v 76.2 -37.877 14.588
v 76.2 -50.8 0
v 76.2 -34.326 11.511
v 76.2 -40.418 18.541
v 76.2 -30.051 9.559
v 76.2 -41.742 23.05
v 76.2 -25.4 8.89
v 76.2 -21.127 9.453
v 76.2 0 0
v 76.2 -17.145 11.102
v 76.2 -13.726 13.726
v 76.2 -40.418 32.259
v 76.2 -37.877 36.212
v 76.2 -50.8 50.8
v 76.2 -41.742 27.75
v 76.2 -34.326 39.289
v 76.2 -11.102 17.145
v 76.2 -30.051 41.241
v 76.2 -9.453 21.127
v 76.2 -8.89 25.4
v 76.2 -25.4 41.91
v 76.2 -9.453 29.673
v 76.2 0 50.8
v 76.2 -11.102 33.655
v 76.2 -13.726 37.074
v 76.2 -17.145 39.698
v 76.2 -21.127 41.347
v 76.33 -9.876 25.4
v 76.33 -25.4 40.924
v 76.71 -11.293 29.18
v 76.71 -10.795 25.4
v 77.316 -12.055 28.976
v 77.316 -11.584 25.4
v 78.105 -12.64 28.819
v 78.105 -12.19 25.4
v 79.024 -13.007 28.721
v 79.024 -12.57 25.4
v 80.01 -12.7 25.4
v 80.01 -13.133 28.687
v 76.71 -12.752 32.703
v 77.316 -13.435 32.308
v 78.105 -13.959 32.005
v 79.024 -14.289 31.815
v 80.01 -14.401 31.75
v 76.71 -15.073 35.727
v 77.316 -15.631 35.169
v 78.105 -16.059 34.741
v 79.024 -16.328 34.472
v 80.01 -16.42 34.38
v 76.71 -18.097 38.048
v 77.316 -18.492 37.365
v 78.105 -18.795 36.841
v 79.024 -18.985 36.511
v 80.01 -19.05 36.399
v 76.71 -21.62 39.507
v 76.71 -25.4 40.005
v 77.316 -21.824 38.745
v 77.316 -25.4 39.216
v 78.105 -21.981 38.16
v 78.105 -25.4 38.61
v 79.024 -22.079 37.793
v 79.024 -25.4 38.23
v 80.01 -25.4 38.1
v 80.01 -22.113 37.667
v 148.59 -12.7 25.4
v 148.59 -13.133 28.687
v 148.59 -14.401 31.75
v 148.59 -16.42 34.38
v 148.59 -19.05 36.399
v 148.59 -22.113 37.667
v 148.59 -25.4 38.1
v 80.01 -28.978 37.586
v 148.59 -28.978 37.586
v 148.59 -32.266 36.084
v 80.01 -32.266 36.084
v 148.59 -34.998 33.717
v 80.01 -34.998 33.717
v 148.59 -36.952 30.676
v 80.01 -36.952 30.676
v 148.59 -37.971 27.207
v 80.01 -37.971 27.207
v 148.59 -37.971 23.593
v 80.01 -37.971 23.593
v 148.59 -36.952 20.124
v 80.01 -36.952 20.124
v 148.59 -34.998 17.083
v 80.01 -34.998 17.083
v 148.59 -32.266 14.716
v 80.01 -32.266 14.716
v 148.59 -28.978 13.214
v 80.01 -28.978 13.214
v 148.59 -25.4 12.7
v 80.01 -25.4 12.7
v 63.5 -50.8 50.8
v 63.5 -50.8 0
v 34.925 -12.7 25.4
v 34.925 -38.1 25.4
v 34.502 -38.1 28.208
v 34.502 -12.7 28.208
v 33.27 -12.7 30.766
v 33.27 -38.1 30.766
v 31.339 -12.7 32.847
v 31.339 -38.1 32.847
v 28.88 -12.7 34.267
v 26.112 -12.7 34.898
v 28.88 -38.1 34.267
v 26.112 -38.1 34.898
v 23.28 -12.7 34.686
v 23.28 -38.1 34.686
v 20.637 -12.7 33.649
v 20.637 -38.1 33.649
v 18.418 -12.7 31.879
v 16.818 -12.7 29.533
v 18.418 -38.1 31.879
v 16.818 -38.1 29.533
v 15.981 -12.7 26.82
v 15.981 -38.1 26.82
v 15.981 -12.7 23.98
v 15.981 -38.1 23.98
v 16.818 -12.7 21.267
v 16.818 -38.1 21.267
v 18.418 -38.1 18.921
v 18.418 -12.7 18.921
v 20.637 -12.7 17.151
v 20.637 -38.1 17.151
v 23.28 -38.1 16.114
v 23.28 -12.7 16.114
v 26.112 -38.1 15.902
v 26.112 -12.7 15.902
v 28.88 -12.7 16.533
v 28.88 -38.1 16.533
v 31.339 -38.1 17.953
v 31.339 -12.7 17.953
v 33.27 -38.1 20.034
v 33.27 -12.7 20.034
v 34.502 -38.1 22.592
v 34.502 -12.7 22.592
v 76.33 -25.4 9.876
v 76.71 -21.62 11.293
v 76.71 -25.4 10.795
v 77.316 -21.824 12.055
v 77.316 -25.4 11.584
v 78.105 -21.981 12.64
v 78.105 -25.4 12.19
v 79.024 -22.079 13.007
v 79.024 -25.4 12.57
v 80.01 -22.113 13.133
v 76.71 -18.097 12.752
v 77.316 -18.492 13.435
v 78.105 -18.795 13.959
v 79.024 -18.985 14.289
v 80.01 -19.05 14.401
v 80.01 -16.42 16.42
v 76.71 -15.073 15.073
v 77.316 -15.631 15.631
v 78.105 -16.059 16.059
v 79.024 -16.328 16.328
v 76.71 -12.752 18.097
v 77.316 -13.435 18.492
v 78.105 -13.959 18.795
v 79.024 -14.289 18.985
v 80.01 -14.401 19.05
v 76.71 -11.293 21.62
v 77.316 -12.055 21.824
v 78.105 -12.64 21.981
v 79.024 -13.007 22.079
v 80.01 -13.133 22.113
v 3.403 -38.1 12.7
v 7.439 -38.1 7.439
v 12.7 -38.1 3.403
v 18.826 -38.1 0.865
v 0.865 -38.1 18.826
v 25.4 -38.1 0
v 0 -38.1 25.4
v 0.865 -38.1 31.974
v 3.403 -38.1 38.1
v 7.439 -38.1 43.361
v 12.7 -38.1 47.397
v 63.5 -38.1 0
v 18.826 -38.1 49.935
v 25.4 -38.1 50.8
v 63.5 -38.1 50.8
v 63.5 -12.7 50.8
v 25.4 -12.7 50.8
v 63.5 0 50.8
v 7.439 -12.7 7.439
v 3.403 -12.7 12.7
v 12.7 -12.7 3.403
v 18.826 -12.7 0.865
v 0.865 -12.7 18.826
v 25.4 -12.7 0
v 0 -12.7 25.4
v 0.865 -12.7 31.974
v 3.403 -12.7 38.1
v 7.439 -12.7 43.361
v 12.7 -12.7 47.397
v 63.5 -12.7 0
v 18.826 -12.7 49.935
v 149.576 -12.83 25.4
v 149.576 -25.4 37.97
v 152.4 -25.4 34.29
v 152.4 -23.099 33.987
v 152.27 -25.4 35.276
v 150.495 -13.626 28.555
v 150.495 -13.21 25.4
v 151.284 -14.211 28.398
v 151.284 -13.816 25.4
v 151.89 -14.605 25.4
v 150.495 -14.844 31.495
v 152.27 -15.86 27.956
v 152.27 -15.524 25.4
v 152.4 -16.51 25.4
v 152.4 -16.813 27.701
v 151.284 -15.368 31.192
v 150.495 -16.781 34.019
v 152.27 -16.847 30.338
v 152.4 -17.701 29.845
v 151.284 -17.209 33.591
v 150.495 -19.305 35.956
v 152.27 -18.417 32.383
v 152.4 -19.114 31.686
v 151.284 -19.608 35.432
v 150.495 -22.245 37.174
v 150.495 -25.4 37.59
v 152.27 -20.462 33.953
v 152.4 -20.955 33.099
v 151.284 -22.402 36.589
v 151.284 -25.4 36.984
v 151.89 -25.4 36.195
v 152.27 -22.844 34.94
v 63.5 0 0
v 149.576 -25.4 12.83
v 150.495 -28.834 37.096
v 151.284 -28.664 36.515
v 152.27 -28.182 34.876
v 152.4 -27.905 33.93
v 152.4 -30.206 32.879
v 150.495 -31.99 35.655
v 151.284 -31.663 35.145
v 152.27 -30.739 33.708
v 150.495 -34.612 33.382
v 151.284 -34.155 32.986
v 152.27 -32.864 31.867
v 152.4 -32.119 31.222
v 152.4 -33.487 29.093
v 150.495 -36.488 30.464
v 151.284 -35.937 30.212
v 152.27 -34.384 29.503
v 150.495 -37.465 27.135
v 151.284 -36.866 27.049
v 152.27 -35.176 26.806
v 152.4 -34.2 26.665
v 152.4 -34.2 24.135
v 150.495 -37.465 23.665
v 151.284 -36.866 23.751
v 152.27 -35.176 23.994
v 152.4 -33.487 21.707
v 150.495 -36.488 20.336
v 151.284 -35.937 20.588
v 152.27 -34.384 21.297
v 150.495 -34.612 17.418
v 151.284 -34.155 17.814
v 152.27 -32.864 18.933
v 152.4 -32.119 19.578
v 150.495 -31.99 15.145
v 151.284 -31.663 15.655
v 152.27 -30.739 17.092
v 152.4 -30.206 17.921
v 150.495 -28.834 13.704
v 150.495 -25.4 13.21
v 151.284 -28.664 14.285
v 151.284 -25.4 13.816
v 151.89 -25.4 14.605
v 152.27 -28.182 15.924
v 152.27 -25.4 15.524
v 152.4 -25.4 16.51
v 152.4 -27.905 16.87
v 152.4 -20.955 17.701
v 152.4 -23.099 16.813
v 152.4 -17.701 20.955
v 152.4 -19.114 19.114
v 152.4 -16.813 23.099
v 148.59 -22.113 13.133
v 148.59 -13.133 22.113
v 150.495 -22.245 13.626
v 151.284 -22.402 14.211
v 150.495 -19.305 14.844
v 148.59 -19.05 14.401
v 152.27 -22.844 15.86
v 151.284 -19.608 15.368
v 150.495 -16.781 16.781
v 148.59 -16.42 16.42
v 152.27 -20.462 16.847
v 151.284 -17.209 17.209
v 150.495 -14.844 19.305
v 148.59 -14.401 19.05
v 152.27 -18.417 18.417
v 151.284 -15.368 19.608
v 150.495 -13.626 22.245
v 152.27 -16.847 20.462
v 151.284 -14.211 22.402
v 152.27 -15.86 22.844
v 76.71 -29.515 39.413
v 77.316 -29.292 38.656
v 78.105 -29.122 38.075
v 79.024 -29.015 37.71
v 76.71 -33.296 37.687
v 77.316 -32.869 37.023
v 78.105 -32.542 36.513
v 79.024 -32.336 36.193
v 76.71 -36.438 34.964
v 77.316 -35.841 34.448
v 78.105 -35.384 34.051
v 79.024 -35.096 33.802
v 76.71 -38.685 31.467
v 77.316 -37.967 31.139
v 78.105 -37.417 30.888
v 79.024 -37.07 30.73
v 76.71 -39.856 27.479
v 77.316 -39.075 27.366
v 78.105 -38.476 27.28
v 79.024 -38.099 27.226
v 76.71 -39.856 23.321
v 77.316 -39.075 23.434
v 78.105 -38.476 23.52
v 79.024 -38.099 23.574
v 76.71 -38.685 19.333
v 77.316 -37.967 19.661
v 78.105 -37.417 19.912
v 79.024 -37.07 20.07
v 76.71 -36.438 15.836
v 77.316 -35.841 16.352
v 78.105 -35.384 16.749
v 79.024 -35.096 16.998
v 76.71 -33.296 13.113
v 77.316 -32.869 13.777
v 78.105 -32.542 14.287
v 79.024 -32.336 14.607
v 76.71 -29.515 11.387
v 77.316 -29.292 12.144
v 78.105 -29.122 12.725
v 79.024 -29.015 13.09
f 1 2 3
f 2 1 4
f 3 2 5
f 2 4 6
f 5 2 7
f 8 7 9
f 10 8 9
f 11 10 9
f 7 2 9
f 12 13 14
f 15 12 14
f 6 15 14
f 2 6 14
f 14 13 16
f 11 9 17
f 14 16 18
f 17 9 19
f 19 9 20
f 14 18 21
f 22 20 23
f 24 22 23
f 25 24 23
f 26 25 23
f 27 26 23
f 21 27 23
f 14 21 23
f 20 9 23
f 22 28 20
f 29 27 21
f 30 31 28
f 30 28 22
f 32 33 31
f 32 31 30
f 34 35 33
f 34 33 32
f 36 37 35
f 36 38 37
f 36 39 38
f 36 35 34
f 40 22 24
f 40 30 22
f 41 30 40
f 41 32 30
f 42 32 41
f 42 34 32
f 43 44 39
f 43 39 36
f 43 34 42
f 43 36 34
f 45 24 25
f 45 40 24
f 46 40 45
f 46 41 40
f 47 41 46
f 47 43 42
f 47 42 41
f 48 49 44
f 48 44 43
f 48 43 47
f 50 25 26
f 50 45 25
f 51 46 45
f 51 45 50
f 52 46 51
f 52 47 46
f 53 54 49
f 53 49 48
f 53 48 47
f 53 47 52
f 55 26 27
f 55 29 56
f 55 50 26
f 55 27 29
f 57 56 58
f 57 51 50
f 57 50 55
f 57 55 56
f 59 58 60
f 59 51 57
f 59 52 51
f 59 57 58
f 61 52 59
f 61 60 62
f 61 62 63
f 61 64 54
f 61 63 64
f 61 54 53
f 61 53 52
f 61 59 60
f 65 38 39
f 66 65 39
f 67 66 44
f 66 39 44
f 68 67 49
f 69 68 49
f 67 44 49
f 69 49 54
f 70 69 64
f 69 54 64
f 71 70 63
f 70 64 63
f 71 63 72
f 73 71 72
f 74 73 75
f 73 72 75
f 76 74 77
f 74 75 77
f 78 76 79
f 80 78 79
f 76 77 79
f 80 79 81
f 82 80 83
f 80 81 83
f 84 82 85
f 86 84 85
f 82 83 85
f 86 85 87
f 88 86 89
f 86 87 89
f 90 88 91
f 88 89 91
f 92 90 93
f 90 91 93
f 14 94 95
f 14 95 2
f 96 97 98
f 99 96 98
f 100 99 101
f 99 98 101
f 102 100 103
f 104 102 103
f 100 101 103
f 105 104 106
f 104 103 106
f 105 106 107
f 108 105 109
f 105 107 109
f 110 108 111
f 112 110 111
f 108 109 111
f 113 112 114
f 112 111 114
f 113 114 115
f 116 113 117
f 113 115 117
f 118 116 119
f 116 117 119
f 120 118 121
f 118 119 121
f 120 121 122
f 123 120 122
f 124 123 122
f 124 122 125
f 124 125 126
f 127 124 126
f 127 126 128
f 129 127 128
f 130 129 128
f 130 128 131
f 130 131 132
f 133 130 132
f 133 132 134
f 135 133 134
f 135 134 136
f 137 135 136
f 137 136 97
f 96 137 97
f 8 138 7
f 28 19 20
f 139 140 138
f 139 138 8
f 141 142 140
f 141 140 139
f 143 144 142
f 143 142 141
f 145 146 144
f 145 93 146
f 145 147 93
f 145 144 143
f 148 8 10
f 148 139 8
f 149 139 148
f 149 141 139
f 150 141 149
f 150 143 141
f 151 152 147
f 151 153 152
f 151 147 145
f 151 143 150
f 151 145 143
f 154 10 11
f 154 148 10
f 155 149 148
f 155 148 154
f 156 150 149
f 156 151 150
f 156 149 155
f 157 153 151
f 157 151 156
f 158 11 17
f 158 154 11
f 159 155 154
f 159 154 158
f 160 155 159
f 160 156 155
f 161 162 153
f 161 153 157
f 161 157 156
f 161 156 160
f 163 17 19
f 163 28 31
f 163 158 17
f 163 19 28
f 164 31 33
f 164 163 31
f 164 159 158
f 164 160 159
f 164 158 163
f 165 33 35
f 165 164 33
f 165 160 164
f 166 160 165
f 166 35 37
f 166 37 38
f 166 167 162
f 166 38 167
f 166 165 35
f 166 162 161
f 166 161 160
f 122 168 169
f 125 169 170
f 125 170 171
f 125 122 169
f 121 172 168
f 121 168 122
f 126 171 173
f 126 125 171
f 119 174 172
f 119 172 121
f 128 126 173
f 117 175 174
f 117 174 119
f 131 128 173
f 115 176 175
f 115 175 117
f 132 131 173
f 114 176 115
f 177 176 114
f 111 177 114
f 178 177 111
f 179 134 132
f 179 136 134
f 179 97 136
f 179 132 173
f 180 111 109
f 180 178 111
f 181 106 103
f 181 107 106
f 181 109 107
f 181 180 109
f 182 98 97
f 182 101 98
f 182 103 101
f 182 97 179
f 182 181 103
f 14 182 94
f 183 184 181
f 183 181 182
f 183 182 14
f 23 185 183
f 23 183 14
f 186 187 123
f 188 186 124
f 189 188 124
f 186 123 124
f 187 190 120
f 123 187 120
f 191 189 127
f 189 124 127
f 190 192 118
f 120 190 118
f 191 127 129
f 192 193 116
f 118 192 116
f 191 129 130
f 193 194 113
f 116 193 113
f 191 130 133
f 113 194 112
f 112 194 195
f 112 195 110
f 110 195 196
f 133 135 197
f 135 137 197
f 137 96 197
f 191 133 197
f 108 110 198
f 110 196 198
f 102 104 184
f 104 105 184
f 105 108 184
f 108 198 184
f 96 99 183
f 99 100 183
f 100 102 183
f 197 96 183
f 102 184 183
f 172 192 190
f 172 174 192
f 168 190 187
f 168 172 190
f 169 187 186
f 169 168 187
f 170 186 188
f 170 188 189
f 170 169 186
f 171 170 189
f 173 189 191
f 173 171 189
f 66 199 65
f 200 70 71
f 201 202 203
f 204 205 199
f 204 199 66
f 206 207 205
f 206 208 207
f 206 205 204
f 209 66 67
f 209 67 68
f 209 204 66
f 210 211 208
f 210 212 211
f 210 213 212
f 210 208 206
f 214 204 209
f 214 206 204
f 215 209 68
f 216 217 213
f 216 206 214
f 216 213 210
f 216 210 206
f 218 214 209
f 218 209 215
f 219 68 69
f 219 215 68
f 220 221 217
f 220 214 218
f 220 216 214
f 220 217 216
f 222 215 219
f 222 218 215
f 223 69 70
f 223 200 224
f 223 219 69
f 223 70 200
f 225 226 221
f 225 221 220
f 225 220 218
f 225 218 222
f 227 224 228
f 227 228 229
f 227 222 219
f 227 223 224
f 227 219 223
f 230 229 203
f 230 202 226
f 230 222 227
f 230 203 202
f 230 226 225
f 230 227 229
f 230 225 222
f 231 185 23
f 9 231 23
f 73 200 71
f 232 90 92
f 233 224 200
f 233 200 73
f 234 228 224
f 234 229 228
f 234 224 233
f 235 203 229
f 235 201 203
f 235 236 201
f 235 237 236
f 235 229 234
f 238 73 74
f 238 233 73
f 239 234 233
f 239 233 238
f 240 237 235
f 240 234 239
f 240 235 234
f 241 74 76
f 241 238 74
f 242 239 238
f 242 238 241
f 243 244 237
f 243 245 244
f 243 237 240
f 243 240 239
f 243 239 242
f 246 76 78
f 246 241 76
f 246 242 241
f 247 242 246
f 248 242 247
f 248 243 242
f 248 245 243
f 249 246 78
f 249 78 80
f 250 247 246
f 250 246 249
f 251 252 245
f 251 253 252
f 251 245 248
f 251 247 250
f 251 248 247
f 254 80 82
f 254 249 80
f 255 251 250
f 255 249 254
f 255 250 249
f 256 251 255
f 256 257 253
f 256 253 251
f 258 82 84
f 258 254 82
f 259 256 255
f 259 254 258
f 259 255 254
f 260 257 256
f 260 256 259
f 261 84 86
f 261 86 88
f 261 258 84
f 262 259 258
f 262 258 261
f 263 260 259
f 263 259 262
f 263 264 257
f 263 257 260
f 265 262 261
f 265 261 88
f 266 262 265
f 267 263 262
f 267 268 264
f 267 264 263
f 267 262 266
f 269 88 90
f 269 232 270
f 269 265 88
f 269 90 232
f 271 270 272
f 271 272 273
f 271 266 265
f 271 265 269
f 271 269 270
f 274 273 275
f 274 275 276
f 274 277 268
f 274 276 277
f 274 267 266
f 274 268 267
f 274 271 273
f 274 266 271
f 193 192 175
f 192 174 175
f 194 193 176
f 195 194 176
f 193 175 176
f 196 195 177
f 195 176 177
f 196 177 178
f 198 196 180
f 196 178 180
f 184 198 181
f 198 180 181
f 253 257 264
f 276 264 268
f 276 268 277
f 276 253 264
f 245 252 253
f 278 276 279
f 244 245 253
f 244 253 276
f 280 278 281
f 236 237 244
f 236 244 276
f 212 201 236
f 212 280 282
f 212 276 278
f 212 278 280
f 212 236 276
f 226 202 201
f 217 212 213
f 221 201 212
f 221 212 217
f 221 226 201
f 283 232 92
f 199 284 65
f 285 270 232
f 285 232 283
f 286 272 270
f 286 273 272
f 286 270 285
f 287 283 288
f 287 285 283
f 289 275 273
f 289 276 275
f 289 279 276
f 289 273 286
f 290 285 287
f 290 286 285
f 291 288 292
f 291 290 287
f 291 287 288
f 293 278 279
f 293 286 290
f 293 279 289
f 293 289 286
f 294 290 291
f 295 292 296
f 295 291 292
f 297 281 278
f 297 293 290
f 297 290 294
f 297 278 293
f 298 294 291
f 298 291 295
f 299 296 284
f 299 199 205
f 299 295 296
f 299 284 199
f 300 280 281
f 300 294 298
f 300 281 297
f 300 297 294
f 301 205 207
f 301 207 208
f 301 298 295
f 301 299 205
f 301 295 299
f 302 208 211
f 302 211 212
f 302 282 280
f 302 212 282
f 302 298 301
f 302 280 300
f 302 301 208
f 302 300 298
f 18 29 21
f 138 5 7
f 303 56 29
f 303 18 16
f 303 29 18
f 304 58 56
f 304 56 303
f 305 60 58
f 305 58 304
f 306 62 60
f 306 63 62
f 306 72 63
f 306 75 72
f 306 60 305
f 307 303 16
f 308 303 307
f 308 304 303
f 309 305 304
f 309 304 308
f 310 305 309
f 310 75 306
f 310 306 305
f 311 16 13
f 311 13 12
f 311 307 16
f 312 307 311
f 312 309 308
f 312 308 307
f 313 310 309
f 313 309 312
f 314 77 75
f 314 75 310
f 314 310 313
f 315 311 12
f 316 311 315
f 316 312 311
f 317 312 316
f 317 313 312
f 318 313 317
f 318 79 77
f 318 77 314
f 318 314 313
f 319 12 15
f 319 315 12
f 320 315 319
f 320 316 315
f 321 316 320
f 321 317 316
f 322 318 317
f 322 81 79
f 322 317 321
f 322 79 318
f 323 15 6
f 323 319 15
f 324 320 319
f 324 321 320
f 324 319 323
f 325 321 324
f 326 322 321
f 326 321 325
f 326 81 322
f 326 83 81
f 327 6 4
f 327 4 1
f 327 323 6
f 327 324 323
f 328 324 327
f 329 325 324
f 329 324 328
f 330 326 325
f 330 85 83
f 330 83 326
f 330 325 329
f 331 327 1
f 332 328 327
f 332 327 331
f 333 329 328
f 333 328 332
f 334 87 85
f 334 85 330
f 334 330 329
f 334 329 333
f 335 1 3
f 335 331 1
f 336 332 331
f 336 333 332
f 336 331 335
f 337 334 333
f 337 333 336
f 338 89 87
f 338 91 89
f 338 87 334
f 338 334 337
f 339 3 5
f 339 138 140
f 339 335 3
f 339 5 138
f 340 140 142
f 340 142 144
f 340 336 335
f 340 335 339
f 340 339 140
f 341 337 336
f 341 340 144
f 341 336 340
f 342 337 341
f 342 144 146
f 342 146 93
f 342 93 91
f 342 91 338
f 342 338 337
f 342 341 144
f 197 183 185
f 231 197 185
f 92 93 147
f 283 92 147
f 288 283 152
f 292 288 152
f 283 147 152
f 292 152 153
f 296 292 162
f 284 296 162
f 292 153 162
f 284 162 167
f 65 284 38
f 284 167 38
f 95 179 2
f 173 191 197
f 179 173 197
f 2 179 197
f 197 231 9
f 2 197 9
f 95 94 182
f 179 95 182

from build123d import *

# Parameters (mm, degrees)
F0_W     = 76.2
F0_H     = 50.8
F1_DEPTH = 50.8
F2_W     = 63.5
F2_H     = 12.7
F3_DEPTH = 177.8
F5_DEPTH = 127
F6_R     = 25.39999
F8_DEPTH = 76.2
F9_R     = 3.81


# Not quite as in the source:
# - a fillet or chamfer is up to 0.001 mm smaller than in the source, because OpenCascade refuses the exact size


with BuildPart() as f1:
    # F0 (on Front) → F1 (new body)
    with BuildSketch(Plane.XZ):
        with Locations((38.1, 25.4)):
            Rectangle(F0_W, F0_H)
    extrude(amount=F1_DEPTH)

    # F2 (on face) → F3 (cut)
    with BuildSketch(Plane.XY.offset(50.8)):
        with Locations((31.75, -6.35)):
            Rectangle(F2_W, F2_H)
        with Locations((31.75, -44.45)):
            Rectangle(F2_W, F2_H)
    extrude(amount=-F3_DEPTH, mode=Mode.SUBTRACT)

    # F4 (on face) → F5 (cut)
    with BuildSketch(Plane.XZ.offset(38.1)):
        with BuildLine():
            ThreePointArc((15.875, 25.4), (25.4, 15.875), (34.925, 25.4))
            ThreePointArc((34.925, 25.4), (25.4, 34.925), (15.875, 25.4))
        make_face()
    extrude(amount=-F5_DEPTH, mode=Mode.SUBTRACT)

    # F6 (radius 25.4 in the source; OpenCascade refuses exactly that, so slightly less here)
    f6_edges = [f1.edges().sort_by_distance(p)[0] for p in [
        (0, -25.4, 0),
        (0, -25.4, 50.8),
    ]]
    fillet(f6_edges, radius=F6_R)

    # F7 (on face) → F8 (join)
    with BuildSketch(Plane.YZ.offset(76.2)):
        with BuildLine():
            ThreePointArc((-12.7, 25.4), (-16.4197438789, 34.3802561211), (-25.4, 38.1))
            Line((-25.4, 38.1), (-25.4, 12.7))
            ThreePointArc((-25.4, 12.7), (-16.4197438789, 16.4197438789), (-12.7, 25.4))
        make_face()
        with BuildLine():
            Line((-25.4, 12.7), (-25.4, 38.1))
            ThreePointArc((-25.4, 38.1), (-38.1, 25.4), (-25.4, 12.7))
        make_face()
    extrude(amount=F8_DEPTH)

    # F9
    f9_edges = [f1.edges().sort_by_distance(p)[0] for p in [
        (152.4, -38.1, 25.4),
        (76.2, -38.1, 25.4),
    ]]
    fillet(f9_edges, radius=F9_R)


solid = f1.part
